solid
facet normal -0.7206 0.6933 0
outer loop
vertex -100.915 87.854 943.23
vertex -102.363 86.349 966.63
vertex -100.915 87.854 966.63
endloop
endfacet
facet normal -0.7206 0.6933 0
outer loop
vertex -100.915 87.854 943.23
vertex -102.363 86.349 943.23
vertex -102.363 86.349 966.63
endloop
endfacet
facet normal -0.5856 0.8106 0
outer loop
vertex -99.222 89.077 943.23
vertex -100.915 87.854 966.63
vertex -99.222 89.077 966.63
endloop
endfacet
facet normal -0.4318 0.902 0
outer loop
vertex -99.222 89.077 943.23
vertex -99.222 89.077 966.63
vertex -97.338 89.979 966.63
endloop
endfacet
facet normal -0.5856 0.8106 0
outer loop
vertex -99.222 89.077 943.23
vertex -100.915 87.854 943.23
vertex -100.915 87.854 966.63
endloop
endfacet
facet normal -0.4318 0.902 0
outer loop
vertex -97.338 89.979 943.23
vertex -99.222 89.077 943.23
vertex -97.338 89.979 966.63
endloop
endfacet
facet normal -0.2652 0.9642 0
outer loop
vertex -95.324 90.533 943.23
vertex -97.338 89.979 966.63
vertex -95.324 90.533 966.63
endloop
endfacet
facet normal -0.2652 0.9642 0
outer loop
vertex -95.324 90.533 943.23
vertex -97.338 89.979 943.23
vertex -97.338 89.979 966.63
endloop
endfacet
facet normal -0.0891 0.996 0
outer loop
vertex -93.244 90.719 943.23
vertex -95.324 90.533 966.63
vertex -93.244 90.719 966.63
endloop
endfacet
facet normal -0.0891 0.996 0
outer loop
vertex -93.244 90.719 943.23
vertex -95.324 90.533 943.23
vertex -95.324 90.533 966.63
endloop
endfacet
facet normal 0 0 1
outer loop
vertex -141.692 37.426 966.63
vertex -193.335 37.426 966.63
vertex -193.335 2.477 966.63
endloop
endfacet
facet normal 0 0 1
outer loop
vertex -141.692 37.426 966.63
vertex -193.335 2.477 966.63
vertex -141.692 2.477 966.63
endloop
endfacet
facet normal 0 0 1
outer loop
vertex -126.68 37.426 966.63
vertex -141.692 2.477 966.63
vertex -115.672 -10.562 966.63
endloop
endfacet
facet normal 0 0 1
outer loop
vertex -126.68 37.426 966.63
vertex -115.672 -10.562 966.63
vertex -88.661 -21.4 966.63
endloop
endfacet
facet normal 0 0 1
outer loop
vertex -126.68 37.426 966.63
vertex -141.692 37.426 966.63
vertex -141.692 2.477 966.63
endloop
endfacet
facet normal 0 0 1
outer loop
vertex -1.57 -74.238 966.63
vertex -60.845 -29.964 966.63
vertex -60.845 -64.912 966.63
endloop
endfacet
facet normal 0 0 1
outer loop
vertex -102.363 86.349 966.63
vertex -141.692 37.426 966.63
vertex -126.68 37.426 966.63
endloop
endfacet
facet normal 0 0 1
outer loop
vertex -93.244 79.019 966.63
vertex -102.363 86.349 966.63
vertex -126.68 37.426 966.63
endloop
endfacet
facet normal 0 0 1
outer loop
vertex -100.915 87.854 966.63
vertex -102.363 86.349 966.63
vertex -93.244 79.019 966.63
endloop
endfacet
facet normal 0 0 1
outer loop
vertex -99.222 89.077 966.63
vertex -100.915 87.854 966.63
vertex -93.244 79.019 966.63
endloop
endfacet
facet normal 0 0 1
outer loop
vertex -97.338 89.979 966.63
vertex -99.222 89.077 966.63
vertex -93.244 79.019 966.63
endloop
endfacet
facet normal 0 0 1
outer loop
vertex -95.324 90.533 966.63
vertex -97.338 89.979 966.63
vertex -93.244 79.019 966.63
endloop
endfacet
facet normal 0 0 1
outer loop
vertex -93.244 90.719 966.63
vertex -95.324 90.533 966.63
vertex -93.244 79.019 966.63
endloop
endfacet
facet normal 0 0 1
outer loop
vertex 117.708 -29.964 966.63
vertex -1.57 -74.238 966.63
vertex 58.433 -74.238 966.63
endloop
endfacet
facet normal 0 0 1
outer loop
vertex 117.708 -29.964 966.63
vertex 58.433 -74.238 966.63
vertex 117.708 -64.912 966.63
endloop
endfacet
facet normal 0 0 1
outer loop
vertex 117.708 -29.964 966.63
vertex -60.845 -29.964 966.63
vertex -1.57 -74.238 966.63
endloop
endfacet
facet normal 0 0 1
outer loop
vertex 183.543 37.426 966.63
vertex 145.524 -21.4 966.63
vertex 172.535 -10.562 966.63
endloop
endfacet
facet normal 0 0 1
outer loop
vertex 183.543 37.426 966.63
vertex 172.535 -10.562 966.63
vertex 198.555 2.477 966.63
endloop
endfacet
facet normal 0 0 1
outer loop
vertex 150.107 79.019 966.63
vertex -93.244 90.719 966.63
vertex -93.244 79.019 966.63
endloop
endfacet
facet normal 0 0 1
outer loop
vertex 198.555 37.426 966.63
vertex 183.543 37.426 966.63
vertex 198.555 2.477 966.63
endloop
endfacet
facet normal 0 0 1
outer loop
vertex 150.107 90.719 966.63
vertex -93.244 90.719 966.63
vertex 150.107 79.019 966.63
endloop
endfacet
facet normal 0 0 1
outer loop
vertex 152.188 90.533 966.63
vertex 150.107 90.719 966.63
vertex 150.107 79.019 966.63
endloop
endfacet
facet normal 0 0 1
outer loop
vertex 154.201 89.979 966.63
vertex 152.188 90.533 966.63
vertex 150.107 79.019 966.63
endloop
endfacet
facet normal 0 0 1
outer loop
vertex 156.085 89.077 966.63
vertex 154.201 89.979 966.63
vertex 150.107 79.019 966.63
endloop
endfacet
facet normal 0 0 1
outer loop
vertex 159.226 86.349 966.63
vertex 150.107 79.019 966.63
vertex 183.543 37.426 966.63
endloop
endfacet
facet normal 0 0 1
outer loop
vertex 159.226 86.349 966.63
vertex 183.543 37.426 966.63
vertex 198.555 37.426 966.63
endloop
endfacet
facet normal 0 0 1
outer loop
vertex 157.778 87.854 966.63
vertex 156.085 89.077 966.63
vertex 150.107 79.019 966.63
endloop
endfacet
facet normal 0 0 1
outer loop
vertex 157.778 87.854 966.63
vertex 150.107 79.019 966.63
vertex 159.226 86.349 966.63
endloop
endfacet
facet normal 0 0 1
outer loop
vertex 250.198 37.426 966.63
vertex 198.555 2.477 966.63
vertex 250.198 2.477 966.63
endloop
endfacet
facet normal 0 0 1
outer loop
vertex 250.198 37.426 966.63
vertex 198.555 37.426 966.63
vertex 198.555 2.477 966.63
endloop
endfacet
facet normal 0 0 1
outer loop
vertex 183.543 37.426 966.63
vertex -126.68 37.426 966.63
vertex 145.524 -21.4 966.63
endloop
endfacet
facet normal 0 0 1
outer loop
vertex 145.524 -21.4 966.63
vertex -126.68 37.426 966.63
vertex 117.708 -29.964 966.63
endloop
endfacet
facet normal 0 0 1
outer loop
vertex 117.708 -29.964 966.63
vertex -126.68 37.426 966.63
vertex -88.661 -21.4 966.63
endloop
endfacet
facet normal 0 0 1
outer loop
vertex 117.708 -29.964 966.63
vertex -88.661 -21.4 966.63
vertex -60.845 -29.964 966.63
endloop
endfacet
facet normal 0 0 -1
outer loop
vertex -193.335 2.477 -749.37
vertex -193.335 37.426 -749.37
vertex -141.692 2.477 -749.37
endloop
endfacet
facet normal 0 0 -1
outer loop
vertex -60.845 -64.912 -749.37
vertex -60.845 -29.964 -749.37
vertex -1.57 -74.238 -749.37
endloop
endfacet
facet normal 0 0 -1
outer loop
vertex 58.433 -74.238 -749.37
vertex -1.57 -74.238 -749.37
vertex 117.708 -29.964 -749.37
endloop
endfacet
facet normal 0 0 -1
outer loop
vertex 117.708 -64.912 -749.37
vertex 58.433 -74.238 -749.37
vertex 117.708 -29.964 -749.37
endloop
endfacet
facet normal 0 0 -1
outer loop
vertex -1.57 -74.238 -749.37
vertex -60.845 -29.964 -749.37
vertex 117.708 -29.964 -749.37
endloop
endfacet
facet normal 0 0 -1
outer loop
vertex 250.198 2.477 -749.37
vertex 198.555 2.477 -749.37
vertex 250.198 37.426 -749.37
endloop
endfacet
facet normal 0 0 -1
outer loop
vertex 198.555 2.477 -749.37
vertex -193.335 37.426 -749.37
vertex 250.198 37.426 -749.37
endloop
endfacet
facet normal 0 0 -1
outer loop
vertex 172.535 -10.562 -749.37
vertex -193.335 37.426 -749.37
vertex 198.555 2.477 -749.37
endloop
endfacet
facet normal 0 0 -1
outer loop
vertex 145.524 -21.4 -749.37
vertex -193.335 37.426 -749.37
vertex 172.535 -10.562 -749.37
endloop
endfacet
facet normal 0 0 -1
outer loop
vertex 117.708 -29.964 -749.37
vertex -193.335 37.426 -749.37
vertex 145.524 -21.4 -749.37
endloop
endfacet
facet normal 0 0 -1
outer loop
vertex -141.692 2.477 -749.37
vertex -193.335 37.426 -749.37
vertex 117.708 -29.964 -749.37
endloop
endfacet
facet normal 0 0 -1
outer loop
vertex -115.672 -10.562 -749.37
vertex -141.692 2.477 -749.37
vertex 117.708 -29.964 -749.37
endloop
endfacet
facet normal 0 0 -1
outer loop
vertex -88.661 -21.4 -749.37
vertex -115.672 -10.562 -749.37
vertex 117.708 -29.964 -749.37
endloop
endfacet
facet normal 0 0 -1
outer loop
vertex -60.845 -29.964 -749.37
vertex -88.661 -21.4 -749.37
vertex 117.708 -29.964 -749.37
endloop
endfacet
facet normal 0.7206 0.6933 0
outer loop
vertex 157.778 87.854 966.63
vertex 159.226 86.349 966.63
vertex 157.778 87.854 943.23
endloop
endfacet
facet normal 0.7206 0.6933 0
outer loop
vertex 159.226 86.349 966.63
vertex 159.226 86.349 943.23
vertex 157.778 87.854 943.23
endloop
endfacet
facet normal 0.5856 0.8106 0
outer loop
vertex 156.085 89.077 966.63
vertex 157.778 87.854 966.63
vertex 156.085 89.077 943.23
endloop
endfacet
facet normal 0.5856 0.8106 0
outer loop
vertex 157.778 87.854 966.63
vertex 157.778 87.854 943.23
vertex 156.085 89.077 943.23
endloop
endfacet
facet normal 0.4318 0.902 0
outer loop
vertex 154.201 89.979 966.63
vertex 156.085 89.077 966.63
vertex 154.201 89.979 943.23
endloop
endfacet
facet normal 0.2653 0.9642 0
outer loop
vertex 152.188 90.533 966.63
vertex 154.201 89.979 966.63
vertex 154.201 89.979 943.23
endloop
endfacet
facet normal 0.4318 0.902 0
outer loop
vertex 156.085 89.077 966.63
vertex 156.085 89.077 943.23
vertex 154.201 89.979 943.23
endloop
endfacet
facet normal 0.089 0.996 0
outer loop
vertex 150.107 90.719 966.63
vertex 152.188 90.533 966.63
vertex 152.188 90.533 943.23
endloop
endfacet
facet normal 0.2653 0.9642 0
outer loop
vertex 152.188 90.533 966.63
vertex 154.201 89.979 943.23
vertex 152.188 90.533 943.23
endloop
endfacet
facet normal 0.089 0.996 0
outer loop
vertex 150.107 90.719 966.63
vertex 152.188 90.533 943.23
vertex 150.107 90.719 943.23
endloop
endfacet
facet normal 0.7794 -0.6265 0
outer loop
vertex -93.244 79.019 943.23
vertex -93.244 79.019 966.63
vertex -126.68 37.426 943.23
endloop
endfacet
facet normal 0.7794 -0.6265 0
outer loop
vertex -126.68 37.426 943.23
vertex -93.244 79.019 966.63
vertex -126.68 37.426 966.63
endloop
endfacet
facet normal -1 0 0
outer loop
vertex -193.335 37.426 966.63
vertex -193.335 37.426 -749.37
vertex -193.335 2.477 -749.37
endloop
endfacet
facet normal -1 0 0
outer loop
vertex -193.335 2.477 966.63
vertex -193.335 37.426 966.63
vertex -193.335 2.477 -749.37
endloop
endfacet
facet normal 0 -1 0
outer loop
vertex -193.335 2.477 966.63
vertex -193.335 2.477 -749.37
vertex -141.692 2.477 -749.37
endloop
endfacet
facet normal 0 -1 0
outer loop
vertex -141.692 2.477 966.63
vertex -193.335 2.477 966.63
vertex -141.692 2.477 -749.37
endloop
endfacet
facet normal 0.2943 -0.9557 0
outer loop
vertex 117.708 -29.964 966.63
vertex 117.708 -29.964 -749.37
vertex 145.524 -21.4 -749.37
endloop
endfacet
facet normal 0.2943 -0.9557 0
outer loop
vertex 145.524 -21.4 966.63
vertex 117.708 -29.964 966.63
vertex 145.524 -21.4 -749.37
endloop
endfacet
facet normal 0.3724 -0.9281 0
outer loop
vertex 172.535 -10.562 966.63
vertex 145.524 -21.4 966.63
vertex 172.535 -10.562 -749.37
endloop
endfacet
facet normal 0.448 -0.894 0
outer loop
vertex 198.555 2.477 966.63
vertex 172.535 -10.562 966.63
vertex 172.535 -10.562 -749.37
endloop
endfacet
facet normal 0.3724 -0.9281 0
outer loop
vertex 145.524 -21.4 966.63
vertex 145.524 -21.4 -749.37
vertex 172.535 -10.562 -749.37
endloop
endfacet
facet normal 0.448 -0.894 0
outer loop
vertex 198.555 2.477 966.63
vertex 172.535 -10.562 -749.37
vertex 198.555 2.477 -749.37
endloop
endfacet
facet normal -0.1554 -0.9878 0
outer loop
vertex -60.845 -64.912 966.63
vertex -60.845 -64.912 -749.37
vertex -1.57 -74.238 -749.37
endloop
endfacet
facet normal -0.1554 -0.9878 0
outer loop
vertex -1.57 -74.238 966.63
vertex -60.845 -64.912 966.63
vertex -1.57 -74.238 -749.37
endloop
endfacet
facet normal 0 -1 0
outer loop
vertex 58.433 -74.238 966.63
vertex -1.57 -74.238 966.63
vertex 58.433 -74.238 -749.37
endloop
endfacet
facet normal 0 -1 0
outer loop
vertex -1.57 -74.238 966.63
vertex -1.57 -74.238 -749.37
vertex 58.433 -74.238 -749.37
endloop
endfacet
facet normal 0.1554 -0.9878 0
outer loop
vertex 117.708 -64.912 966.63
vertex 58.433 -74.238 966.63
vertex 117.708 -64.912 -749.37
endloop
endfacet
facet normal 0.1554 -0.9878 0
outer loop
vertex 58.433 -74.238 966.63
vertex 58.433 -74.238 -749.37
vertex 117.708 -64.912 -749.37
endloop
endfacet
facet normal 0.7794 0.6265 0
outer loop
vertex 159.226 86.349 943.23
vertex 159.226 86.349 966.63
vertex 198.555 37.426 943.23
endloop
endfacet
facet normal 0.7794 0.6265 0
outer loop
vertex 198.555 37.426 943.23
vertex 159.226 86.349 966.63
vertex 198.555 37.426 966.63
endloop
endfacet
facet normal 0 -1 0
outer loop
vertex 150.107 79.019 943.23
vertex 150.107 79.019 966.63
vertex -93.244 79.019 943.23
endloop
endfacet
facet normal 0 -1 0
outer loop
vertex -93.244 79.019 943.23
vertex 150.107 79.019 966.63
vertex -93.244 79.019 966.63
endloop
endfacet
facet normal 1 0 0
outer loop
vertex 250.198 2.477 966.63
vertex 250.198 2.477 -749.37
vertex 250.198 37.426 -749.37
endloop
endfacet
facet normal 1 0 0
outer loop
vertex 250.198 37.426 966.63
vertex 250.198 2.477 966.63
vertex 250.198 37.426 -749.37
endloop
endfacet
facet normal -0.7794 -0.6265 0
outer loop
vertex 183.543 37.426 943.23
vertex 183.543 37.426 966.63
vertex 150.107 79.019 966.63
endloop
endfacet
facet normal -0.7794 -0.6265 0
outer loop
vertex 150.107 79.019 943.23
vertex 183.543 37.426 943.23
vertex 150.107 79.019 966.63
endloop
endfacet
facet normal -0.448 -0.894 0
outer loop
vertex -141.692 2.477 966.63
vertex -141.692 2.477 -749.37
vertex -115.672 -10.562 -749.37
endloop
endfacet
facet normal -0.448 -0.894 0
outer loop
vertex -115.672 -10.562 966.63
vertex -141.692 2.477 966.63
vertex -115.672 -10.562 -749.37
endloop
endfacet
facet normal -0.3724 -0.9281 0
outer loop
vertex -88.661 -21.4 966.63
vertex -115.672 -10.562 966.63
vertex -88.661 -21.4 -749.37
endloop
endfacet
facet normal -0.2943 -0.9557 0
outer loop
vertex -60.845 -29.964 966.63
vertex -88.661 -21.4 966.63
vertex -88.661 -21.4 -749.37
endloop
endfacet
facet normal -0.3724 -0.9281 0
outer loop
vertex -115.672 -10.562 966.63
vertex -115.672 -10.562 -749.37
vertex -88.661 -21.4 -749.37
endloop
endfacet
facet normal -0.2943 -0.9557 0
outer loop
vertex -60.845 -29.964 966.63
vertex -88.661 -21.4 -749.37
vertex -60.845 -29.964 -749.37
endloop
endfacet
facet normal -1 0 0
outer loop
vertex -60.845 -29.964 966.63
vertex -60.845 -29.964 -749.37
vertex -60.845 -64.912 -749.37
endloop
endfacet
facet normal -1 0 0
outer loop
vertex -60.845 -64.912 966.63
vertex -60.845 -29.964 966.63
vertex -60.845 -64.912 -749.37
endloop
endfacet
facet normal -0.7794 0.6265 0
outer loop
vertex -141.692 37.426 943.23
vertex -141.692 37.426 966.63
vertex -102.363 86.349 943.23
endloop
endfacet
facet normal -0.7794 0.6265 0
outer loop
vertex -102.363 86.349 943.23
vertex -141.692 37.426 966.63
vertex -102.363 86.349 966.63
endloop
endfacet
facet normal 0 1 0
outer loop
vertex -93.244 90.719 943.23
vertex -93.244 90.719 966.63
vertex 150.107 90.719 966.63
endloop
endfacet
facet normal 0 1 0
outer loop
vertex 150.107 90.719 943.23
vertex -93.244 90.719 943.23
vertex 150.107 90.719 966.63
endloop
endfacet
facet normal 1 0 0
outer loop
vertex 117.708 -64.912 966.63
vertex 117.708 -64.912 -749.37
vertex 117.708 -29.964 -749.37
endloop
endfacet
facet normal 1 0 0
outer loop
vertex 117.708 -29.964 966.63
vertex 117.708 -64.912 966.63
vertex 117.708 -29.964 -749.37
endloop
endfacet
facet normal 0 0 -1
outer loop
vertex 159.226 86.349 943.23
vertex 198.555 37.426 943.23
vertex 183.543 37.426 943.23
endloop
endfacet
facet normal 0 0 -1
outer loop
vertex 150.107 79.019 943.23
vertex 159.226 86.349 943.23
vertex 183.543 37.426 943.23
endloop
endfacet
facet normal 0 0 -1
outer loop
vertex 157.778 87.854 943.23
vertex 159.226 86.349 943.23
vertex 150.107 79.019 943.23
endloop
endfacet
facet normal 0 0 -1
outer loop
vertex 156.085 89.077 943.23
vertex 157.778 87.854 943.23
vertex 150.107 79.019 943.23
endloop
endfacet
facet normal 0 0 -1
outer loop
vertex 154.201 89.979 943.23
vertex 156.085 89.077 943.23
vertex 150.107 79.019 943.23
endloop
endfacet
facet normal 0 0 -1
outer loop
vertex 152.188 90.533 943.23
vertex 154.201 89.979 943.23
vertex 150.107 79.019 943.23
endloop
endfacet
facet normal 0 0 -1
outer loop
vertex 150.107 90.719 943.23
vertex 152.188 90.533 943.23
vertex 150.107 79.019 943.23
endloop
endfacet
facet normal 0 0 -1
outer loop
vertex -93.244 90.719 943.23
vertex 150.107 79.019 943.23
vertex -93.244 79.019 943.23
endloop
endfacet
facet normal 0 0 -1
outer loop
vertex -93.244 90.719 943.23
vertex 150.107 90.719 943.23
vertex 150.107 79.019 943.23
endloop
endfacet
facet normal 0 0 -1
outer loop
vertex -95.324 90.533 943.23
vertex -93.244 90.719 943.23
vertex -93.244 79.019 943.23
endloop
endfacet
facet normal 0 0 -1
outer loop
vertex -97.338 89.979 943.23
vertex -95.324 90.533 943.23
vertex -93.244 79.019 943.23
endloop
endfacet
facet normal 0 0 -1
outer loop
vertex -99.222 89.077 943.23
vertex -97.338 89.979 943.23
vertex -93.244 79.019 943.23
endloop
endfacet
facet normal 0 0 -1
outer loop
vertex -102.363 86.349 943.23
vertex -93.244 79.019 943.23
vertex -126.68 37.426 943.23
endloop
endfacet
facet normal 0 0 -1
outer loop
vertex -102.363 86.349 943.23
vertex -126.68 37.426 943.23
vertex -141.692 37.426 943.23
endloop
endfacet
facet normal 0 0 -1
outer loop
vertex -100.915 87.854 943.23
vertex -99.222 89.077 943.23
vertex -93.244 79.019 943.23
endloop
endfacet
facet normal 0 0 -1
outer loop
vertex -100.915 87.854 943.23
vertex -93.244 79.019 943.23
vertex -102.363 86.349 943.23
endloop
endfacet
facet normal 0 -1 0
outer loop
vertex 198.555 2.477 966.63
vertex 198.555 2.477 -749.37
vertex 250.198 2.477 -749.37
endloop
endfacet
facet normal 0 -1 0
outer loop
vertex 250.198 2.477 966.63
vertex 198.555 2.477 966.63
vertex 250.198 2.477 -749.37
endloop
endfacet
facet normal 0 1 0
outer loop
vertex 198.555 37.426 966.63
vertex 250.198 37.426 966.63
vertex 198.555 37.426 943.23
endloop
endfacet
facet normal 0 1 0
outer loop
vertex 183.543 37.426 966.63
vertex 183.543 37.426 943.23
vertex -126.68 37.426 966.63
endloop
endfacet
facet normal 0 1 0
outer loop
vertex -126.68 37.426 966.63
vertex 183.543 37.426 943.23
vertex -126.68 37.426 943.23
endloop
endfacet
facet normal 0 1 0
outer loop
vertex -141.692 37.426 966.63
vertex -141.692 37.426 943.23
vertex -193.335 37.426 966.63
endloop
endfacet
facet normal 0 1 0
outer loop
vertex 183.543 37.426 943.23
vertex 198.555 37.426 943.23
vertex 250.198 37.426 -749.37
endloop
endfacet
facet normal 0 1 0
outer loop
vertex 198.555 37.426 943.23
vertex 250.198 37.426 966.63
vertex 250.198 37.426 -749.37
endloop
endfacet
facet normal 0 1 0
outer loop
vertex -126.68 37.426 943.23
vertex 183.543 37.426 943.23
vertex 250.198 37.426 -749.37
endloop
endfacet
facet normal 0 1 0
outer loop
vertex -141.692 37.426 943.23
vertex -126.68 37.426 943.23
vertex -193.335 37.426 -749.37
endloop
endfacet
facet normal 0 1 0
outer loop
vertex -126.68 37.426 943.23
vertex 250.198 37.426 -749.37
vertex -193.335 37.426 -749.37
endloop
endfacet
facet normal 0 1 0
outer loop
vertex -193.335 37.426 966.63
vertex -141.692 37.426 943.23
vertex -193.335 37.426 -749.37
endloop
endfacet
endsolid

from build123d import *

# Parameters (mm, degrees)
BOSS_EXTRUDE1_DEPTH = 220
BOSS_EXTRUDE2_DEPTH = 3
FILLET1_R           = 1.5
SCALE1_SCALE        = 15.6
SCALE2_SCALE        = 0.5


with BuildPart() as part:
    # Sketch1 → Boss-Extrude1 (new body)
    with BuildSketch(Plane.XY):
        with BuildLine():
            Line((0, 0), (0, -4.480629882))
            Line((0, -4.480629882), (6.620887994, -4.480629882))
            ThreePointArc((6.620887994, -4.480629882), (11.673872347, -6.882935474), (16.9859081, -8.639636697))
            Line((16.9859081, -8.639636697), (16.9859081, -13.120266579))
            ThreePointArc((16.9859081, -13.120266579), (28.43159427, -14.466004542), (39.877280439, -13.120266579))
            Line((39.877280439, -13.120266579), (39.877280439, -8.639636697))
            ThreePointArc((39.877280439, -8.639636697), (45.189316192, -6.882935474), (50.242300545, -4.480629882))
            Line((50.242300545, -4.480629882), (56.863188539, -4.480629882))
            Line((56.863188539, -4.480629882), (56.863188539, 0))
            Line((56.863188539, 0), (0, 0))
        make_face()
    extrude(amount=BOSS_EXTRUDE1_DEPTH)

    # Sketch2 → Boss-Extrude2 (add)
    with BuildSketch(Plane.XY.offset(220)):
        Polygon((6.620887994, 0), (12.113374984, 6.832485321), (44.749813555, 6.832485321), (50.242300545, 0), (48.317723739, 0), (44.031054266, 5.332485321), (12.832134273, 5.332485321), (8.545464801, 0), align=None)
    extrude(amount=-BOSS_EXTRUDE2_DEPTH)

    # Fillet1
    fillet1_edges = [part.edges().sort_by_distance(p)[0] for p in [
        (12.113374984, 6.832485321, 218.5),
        (44.749813555, 6.832485321, 218.5),
    ]]
    fillet(fillet1_edges, radius=FILLET1_R)


with BuildPart() as part_1:
    # Scale1: scaled about (28.43159427, -5.503767505, 110.201488626)
    add(part.part.scale(SCALE1_SCALE).moved(Location((-415.101276342, 80.355005573, -1608.94173394))))


with BuildPart() as part_2:
    # Scale2: scaled about (28.431594264, -5.503767501, 110.201488629)
    add(part_1.part.scale(SCALE2_SCALE).moved(Location((14.215797132, -2.75188375, 55.100744314))))


solid = part_2.part
